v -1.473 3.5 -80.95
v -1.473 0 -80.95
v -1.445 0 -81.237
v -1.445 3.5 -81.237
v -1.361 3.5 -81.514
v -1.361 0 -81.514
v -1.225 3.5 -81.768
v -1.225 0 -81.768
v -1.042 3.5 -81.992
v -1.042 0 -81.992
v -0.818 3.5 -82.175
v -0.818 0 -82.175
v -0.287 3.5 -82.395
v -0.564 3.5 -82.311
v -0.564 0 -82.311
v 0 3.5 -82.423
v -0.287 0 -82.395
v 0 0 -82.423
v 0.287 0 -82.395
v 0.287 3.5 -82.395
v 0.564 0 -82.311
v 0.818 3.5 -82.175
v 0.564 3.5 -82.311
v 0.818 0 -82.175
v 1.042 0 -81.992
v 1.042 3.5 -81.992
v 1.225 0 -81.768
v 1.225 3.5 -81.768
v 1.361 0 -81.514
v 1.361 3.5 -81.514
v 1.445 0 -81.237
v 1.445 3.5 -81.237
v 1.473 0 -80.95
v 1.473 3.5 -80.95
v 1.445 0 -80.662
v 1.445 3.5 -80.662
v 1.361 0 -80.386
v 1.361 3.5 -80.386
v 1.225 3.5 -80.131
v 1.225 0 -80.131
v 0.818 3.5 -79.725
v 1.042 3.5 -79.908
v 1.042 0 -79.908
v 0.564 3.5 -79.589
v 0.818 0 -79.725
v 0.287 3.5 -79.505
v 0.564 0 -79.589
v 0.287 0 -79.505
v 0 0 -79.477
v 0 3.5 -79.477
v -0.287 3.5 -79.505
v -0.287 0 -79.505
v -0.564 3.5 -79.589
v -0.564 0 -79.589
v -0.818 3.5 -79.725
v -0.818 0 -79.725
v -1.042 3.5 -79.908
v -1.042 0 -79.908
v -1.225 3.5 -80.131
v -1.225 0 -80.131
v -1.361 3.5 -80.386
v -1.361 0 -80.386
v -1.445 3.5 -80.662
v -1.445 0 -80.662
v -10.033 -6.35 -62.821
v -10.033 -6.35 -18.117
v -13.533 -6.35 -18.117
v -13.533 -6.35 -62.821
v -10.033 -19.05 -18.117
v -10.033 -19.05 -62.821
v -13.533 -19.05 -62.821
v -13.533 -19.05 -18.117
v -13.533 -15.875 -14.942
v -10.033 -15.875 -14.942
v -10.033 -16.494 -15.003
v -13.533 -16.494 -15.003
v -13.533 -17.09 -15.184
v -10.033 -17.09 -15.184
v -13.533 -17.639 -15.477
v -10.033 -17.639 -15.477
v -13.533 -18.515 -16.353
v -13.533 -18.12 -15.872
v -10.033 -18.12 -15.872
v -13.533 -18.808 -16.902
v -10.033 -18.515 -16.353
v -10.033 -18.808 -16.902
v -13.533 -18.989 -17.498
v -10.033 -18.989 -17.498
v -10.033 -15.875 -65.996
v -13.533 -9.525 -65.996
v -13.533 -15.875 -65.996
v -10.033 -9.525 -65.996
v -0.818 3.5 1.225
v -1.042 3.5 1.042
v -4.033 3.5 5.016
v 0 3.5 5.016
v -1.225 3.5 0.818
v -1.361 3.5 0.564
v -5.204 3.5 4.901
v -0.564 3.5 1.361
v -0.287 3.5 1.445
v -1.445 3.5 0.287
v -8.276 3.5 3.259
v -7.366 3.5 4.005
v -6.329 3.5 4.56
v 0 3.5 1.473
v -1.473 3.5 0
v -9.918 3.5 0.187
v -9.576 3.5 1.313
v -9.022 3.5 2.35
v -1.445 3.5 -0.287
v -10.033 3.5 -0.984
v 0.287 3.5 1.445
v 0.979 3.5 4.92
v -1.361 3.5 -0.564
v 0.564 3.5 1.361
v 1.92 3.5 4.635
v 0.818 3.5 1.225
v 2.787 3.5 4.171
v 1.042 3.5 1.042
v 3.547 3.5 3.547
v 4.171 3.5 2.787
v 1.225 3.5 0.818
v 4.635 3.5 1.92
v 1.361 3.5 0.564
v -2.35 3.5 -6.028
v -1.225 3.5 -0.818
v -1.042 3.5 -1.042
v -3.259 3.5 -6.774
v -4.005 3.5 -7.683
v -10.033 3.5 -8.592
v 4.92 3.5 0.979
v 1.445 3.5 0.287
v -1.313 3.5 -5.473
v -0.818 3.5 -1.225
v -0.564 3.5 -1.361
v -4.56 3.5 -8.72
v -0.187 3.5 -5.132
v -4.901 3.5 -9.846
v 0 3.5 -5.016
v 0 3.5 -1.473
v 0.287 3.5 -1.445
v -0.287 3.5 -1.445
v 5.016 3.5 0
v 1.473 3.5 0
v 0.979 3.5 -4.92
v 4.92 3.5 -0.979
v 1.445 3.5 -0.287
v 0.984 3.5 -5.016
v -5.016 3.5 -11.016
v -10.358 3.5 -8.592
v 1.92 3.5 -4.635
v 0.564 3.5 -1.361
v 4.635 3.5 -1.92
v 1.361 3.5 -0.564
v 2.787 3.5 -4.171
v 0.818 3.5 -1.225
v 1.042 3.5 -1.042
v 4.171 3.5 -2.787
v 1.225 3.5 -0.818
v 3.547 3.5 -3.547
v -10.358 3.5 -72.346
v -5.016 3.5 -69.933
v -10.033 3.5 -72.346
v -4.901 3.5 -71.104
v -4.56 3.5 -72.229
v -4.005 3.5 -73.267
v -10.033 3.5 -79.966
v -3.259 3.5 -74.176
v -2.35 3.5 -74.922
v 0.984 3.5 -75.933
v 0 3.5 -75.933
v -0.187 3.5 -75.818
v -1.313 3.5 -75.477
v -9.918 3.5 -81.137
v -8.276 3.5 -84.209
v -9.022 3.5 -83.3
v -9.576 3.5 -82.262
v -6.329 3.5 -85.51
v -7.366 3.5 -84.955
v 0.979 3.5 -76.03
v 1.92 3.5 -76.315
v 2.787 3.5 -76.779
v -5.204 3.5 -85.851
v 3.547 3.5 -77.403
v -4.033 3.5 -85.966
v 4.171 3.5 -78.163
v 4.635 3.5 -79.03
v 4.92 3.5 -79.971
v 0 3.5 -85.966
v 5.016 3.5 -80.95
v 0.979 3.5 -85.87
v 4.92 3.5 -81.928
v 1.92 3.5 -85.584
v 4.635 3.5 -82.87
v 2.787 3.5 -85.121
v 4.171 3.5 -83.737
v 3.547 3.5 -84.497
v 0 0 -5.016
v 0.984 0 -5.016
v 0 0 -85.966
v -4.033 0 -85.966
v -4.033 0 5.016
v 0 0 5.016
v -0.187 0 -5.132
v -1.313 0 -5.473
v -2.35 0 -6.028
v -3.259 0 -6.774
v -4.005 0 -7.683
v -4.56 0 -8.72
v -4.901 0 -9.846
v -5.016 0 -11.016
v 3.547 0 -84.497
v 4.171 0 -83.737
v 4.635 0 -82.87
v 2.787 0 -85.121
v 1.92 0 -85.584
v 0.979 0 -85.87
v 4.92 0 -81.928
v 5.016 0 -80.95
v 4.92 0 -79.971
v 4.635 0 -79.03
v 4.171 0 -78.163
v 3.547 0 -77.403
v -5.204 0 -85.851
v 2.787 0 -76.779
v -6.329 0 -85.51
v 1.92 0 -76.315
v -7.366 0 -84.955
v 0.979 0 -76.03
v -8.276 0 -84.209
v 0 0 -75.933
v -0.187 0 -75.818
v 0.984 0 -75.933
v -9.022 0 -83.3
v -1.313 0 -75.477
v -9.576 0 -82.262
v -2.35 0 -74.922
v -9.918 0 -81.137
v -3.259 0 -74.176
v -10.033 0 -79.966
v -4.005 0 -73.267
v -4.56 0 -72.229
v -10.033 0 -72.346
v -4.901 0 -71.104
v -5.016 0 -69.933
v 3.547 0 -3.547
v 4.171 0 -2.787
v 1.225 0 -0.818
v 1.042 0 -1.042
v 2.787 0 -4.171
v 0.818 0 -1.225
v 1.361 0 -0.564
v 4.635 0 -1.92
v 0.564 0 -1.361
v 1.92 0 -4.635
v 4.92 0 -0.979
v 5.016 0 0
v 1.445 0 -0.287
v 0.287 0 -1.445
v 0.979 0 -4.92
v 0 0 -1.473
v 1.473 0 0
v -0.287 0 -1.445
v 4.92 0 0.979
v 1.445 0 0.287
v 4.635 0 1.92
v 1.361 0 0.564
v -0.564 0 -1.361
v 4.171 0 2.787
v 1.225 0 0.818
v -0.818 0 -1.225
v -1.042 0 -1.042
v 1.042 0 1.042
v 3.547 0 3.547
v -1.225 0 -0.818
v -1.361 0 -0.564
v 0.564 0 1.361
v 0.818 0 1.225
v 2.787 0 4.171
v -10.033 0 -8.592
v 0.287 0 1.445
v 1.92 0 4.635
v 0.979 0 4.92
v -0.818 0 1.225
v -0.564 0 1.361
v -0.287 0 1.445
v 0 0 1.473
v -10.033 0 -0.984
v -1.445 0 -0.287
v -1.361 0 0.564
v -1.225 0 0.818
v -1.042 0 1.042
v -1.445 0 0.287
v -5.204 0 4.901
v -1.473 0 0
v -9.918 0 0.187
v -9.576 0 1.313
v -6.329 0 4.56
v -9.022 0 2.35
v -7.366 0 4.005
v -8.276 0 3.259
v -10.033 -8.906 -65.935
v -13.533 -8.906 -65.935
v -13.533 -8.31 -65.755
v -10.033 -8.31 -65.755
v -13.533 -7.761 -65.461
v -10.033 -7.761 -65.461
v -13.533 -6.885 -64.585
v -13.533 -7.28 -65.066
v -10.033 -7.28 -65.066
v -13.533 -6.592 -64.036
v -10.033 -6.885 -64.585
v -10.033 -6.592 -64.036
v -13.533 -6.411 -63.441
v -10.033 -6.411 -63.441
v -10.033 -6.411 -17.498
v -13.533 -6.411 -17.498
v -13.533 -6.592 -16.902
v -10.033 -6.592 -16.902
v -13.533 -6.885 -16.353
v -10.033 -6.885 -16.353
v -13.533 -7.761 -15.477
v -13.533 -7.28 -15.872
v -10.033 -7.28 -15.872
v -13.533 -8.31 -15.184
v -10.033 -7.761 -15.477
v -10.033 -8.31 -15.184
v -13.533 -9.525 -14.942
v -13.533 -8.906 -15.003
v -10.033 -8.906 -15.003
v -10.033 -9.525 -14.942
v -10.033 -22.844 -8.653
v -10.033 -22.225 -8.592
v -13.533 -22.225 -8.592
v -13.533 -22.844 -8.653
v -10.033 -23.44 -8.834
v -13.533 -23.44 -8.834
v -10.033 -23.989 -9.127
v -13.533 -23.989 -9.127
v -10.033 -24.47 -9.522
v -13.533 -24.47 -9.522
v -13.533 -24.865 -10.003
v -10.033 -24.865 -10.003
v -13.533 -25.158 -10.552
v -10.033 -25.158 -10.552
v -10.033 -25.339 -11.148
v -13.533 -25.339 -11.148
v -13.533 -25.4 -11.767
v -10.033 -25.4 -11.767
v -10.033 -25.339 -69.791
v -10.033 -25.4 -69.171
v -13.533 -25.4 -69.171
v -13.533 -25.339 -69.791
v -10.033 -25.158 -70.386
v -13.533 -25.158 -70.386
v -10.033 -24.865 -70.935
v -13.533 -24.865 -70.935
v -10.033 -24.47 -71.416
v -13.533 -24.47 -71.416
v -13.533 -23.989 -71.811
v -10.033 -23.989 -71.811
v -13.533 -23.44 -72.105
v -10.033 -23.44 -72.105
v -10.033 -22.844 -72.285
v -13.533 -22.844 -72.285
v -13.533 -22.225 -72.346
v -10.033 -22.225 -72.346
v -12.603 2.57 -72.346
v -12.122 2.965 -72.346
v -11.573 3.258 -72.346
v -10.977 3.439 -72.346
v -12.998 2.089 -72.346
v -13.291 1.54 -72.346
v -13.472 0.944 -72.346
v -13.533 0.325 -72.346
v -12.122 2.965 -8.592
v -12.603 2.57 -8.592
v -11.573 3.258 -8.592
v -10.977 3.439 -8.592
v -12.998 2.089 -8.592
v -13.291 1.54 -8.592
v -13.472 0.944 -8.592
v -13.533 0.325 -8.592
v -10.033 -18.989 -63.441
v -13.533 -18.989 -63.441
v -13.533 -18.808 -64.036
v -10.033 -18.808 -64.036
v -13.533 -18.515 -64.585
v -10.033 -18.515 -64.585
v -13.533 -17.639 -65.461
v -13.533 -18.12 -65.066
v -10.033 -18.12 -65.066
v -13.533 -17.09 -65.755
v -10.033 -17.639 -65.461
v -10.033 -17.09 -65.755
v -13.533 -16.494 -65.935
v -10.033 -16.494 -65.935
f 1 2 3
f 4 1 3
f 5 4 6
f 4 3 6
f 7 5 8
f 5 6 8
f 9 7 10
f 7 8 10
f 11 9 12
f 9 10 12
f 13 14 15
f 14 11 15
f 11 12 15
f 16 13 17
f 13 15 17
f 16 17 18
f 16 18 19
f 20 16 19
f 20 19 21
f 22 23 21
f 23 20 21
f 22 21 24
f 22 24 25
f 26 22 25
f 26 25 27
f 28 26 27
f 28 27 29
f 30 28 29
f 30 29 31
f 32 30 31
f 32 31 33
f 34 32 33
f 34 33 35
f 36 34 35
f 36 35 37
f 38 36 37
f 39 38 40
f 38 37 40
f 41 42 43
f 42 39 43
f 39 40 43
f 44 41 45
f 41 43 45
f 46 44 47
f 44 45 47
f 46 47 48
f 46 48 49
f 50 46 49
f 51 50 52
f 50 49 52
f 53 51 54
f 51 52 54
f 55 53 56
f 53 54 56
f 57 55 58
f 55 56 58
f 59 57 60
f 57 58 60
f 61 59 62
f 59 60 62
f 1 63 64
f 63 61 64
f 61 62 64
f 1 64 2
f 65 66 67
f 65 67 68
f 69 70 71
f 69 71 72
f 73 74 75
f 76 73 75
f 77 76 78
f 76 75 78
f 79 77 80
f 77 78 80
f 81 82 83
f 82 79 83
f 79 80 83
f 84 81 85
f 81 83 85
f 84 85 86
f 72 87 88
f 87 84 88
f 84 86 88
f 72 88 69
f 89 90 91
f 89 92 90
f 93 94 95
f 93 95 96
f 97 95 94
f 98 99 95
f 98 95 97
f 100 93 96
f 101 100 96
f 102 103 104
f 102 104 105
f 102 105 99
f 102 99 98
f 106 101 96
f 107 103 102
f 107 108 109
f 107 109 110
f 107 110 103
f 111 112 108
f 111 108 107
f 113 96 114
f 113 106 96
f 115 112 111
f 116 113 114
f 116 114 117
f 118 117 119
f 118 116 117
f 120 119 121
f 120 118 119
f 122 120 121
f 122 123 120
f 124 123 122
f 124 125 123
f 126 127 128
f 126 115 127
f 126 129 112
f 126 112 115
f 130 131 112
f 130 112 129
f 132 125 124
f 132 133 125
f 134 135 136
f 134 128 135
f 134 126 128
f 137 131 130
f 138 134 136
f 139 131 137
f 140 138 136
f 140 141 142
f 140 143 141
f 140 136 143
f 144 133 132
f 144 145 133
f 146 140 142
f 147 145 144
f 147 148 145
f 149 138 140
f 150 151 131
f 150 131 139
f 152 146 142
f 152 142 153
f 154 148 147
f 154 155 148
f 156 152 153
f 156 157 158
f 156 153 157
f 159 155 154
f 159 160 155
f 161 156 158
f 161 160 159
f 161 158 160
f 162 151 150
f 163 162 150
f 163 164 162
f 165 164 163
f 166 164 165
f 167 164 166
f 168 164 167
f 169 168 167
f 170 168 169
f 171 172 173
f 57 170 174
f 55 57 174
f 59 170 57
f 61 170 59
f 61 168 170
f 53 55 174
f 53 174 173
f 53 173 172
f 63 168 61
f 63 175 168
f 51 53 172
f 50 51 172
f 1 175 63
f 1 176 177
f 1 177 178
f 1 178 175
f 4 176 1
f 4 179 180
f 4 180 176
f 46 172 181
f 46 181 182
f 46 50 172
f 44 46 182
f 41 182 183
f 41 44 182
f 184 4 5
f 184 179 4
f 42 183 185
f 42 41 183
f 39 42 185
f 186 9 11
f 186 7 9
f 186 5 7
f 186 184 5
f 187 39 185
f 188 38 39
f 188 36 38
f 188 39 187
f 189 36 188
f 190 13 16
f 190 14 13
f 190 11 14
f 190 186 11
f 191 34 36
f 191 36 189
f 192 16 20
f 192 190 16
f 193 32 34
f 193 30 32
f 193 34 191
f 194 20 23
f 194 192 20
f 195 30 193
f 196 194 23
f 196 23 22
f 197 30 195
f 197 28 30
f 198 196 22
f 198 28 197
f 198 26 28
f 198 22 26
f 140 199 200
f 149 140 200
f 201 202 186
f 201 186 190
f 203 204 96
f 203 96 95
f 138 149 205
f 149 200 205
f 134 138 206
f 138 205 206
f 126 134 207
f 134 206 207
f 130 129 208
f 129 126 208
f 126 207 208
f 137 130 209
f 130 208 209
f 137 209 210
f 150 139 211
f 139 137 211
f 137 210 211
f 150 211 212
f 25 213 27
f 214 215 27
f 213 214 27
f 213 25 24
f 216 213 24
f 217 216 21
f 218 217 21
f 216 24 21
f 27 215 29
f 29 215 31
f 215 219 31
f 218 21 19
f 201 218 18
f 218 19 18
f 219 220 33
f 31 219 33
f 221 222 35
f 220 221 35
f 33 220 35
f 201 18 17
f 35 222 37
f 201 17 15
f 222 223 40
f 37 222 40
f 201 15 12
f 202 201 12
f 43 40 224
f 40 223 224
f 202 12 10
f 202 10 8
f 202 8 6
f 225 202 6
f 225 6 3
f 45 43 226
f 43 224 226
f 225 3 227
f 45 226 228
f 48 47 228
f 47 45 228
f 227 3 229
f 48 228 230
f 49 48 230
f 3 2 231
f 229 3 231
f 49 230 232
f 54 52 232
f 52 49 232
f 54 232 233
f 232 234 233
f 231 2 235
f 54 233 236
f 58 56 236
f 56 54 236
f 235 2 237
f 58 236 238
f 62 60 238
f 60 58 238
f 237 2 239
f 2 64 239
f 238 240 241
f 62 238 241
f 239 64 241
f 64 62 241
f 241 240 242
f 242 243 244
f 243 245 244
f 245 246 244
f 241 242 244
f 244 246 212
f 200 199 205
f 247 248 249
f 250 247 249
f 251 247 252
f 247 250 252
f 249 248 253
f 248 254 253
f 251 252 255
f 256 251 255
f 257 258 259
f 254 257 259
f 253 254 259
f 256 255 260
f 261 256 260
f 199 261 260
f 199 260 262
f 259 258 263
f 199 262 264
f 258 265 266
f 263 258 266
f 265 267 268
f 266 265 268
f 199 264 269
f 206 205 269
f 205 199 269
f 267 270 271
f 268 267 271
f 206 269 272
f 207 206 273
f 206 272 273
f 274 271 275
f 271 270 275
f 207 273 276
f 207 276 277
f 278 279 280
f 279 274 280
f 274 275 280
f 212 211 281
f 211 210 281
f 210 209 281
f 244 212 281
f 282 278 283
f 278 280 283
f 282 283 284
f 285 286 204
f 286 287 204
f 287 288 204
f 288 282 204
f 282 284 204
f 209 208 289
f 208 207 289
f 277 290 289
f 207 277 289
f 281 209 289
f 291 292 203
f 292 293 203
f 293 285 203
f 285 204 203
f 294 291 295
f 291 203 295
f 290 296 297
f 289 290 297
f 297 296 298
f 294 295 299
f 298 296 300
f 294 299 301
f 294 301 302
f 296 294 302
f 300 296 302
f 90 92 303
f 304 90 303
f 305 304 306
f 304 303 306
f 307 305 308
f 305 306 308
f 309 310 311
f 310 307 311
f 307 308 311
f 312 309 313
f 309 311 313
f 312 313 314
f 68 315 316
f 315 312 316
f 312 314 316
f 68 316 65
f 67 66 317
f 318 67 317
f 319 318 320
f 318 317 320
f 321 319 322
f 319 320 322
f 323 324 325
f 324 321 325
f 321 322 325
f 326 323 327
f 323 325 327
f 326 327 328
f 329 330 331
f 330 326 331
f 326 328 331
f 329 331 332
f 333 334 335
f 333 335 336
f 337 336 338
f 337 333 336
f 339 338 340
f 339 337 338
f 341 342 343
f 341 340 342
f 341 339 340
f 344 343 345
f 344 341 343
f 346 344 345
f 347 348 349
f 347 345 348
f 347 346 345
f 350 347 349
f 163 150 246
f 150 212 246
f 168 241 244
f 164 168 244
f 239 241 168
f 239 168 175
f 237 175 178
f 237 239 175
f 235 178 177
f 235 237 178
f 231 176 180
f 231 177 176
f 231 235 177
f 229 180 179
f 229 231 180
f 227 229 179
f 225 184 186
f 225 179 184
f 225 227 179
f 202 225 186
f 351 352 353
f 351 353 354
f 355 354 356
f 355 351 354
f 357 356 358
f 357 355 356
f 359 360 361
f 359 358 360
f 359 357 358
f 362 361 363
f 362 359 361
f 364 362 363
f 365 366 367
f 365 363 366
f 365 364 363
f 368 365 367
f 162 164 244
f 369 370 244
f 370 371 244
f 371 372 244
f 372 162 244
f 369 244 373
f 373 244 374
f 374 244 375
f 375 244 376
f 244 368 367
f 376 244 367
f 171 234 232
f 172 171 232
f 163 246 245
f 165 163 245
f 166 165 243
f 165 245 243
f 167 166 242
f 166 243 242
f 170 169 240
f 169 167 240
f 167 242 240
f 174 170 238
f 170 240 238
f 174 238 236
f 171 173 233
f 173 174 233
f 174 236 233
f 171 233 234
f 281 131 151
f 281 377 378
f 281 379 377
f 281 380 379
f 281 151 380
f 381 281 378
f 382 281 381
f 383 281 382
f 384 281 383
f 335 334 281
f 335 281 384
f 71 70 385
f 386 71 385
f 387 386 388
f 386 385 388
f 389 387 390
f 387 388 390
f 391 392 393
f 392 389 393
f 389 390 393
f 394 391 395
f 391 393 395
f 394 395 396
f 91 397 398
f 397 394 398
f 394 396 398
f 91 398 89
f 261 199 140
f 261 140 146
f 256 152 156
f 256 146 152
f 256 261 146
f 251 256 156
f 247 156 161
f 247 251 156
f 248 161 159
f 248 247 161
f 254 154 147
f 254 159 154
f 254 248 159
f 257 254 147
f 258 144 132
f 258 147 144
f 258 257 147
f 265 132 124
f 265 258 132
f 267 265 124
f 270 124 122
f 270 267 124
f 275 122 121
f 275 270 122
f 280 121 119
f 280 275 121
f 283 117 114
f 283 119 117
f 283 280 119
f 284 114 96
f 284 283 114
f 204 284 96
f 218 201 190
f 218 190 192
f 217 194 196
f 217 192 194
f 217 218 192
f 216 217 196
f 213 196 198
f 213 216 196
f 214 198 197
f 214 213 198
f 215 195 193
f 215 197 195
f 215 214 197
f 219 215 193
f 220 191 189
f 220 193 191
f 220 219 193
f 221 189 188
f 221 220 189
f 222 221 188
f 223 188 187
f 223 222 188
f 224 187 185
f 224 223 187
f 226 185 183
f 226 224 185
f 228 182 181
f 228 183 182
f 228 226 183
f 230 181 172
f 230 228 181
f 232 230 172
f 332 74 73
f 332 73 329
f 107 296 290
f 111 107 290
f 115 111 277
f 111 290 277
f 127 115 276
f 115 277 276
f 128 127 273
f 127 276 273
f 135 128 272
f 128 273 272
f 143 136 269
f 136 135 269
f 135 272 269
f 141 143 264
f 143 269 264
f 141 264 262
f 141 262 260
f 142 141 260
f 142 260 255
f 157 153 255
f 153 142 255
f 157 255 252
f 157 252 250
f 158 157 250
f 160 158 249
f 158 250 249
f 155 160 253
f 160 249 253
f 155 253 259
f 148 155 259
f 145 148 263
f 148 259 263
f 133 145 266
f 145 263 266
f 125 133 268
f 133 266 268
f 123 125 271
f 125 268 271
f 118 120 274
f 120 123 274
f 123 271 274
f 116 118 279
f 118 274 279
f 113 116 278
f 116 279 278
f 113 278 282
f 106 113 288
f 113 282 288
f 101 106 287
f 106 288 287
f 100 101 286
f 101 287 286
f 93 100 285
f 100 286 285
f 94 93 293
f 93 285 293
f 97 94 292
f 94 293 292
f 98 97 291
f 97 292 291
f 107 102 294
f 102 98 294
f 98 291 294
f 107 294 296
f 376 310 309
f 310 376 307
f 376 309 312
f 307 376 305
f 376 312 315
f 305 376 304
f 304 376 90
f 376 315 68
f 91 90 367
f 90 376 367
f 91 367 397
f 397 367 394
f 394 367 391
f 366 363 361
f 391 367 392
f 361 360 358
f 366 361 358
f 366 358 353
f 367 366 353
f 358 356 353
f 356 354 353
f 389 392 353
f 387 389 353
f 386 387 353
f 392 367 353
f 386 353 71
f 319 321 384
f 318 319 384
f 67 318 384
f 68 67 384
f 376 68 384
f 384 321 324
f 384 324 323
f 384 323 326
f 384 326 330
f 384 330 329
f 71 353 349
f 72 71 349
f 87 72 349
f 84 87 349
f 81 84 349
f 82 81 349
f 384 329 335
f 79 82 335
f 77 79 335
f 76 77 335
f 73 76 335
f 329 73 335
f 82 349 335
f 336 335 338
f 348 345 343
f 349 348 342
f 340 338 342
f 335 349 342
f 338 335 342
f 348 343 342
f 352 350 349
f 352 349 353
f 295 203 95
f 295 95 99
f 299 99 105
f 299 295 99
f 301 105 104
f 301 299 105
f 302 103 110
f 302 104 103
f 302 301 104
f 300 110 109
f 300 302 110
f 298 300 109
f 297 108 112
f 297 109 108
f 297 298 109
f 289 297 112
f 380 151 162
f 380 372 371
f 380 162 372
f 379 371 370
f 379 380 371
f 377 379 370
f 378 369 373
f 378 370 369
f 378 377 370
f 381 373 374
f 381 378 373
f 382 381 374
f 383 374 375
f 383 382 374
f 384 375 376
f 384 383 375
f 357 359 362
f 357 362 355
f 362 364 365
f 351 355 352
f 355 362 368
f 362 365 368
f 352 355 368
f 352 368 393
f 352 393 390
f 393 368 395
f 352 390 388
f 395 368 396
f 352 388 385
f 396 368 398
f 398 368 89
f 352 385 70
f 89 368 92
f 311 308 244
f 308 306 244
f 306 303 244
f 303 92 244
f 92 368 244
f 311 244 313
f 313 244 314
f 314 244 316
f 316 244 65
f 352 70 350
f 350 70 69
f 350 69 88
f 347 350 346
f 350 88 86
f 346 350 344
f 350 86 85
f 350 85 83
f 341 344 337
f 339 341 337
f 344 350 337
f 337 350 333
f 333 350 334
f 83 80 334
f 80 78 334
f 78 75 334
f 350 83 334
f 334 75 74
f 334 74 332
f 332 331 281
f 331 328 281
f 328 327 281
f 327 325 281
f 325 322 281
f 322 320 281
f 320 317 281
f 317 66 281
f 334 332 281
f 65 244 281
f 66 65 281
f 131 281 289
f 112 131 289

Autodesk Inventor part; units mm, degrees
ref_plane "YZ Plane" through (0, 0, 0) normal (1, 0, 0) x (0, 1, 0)
ref_plane "XZ Plane" through (0, 0, 0) normal (0, 1, 0) x (-1, 0, 0)
ref_plane "XY Plane" through (0, 0, 0) normal (0, 0, 1) x (1, 0, 0)
sketch "Sketch1" plane through (0, 0, 0) normal (0, 1, 0) x (-1, 0, 0)
  circle A0 centre (0, 0) radius 1.4732
  circle A1 centre (0, -80.9498) radius 1.4732
  circle A2 centre (0, 0) radius 5.0165
  circle A3 centre (0, -80.9498) radius 5.0165
  line L0 (0, 5.0165) -> (4.033, 5.0165)
  line L1 (4.033, -85.9663) -> (0, -85.9663)
  line L2 (10.033, -79.9663) -> (10.033, -0.9835)
  line L3 (0, -5.0165) -> (-0.9835, -5.0165)
  line L4 (5.0165, -11.0165) -> (5.0165, -69.9333)
  line L5 (-0.9835, -75.9333) -> (0, -75.9333)
  arc A4 (10.033, -0.9835) -> (4.033, 5.0165) centre (4.033, -0.9835) ccw
  arc A5 (4.033, -85.9663) -> (10.033, -79.9663) centre (4.033, -79.9663) ccw
  arc A6 (5.0165, -11.0165) -> (-0.9835, -5.0165) centre (-0.9835, -11.0165) ccw
  arc A7 (-0.9835, -75.9333) -> (5.0165, -69.9333) centre (-0.9835, -69.9333) ccw
  point P0 (10.033, 5.0165)
  dimension "d0" = 2.9464
  dimension "d2" = 2.9464
  dimension "d3" = 10.033
  dimension "d4" = 10.033
  dimension "d7" = 80.9498
  dimension "d8" = 10.033
  dimension "d9" = 6
  dimension "d10" = 6
  dimension "d11" = 6
  dimension "d12" = 6
extrude "Extrusion1" add sketch "Sketch1" along normal blind 3.5
sketch "Sketch2" plane through (-10.033, 0, -79.9663) normal (-1, 0, 0) x (0, 0, 1)
  line L0 (0, 0) -> (0, 3.5) projected
  line L1 (0, 0) -> (7.62, 0)
  line L2 (0, 0) -> (78.9828, 0) projected
  line L3 (7.62, 0) -> (7.62, -22.225)
  line L4 (7.62, 0) -> (71.374, 0)
  line L5 (68.9498, 0) -> (10.033, 0) projected
  line L6 (71.374, 0) -> (71.374, -22.225)
  line L7 (68.199, -25.4) -> (10.795, -25.4)
  line L8 (7.62, 0) -> (19.2419, 0) construction
  line L9 (71.374, 0) -> (44.6419, 0) construction
  line L10 (61.849, -6.35) -> (17.145, -6.35)
  line L11 (17.145, -19.05) -> (61.849, -19.05)
  line L12 (65.024, -15.875) -> (65.024, -9.525)
  line L13 (13.97, -9.525) -> (13.97, -15.875)
  arc A0 (17.145, -6.35) -> (13.97, -9.525) centre (17.145, -9.525) ccw
  arc A1 (65.024, -9.525) -> (61.849, -6.35) centre (61.849, -9.525) ccw
  arc A2 (61.849, -19.05) -> (65.024, -15.875) centre (61.849, -15.875) ccw
  arc A3 (13.97, -15.875) -> (17.145, -19.05) centre (17.145, -15.875) ccw
  arc A4 (7.62, -22.225) -> (10.795, -25.4) centre (10.795, -22.225) ccw
  arc A5 (68.199, -25.4) -> (71.374, -22.225) centre (68.199, -22.225) ccw
  point P0 (79.9663, 0)
  point P1 (7.62, -25.4)
  point P2 (13.97, -6.35)
  point P3 (71.374, 0)
  dimension "d15" = 7.62
  dimension "d16" = 25.4
  dimension "d17" = 63.754
  dimension "d19" = 6.35
  dimension "d22" = 3.175
  dimension "d23" = 3.175
  dimension "d24" = 3.175
  dimension "d25" = 3.175
  dimension "d26" = 3.175
  dimension "d27" = 3.175
  dimension "d33" = 44.704
  dimension "d34" = 44.704
extrude "Extrusion2" add sketch "Sketch2" along normal blind 3.5
sketch "Sketch4" plane through (-10.033, 0, -8.5923) normal (0, 1, 0) x (1, 0, 0)
  line L0 (0, 63.754) -> (-3.5, 63.754) projected
  line L1 (0, 63.754) -> (-3.5, 63.754)
  line L2 (0, 0) -> (-3.5, 0) projected
  line L3 (-3.5, 63.754) -> (-3.5, 0)
  line L4 (-3.5, 0) -> (0, 0)
  line L5 (0, 0) -> (0, 63.754)
  point P0 (10.033, -8.5923)
extrude "Extrusion3" add sketch "Sketch4" along normal blind 3.5
fillet "Fillet1" radius 3.175 1 edges at (-13.533, 3.5, -40.4693)
properties part number "sidemount3"
